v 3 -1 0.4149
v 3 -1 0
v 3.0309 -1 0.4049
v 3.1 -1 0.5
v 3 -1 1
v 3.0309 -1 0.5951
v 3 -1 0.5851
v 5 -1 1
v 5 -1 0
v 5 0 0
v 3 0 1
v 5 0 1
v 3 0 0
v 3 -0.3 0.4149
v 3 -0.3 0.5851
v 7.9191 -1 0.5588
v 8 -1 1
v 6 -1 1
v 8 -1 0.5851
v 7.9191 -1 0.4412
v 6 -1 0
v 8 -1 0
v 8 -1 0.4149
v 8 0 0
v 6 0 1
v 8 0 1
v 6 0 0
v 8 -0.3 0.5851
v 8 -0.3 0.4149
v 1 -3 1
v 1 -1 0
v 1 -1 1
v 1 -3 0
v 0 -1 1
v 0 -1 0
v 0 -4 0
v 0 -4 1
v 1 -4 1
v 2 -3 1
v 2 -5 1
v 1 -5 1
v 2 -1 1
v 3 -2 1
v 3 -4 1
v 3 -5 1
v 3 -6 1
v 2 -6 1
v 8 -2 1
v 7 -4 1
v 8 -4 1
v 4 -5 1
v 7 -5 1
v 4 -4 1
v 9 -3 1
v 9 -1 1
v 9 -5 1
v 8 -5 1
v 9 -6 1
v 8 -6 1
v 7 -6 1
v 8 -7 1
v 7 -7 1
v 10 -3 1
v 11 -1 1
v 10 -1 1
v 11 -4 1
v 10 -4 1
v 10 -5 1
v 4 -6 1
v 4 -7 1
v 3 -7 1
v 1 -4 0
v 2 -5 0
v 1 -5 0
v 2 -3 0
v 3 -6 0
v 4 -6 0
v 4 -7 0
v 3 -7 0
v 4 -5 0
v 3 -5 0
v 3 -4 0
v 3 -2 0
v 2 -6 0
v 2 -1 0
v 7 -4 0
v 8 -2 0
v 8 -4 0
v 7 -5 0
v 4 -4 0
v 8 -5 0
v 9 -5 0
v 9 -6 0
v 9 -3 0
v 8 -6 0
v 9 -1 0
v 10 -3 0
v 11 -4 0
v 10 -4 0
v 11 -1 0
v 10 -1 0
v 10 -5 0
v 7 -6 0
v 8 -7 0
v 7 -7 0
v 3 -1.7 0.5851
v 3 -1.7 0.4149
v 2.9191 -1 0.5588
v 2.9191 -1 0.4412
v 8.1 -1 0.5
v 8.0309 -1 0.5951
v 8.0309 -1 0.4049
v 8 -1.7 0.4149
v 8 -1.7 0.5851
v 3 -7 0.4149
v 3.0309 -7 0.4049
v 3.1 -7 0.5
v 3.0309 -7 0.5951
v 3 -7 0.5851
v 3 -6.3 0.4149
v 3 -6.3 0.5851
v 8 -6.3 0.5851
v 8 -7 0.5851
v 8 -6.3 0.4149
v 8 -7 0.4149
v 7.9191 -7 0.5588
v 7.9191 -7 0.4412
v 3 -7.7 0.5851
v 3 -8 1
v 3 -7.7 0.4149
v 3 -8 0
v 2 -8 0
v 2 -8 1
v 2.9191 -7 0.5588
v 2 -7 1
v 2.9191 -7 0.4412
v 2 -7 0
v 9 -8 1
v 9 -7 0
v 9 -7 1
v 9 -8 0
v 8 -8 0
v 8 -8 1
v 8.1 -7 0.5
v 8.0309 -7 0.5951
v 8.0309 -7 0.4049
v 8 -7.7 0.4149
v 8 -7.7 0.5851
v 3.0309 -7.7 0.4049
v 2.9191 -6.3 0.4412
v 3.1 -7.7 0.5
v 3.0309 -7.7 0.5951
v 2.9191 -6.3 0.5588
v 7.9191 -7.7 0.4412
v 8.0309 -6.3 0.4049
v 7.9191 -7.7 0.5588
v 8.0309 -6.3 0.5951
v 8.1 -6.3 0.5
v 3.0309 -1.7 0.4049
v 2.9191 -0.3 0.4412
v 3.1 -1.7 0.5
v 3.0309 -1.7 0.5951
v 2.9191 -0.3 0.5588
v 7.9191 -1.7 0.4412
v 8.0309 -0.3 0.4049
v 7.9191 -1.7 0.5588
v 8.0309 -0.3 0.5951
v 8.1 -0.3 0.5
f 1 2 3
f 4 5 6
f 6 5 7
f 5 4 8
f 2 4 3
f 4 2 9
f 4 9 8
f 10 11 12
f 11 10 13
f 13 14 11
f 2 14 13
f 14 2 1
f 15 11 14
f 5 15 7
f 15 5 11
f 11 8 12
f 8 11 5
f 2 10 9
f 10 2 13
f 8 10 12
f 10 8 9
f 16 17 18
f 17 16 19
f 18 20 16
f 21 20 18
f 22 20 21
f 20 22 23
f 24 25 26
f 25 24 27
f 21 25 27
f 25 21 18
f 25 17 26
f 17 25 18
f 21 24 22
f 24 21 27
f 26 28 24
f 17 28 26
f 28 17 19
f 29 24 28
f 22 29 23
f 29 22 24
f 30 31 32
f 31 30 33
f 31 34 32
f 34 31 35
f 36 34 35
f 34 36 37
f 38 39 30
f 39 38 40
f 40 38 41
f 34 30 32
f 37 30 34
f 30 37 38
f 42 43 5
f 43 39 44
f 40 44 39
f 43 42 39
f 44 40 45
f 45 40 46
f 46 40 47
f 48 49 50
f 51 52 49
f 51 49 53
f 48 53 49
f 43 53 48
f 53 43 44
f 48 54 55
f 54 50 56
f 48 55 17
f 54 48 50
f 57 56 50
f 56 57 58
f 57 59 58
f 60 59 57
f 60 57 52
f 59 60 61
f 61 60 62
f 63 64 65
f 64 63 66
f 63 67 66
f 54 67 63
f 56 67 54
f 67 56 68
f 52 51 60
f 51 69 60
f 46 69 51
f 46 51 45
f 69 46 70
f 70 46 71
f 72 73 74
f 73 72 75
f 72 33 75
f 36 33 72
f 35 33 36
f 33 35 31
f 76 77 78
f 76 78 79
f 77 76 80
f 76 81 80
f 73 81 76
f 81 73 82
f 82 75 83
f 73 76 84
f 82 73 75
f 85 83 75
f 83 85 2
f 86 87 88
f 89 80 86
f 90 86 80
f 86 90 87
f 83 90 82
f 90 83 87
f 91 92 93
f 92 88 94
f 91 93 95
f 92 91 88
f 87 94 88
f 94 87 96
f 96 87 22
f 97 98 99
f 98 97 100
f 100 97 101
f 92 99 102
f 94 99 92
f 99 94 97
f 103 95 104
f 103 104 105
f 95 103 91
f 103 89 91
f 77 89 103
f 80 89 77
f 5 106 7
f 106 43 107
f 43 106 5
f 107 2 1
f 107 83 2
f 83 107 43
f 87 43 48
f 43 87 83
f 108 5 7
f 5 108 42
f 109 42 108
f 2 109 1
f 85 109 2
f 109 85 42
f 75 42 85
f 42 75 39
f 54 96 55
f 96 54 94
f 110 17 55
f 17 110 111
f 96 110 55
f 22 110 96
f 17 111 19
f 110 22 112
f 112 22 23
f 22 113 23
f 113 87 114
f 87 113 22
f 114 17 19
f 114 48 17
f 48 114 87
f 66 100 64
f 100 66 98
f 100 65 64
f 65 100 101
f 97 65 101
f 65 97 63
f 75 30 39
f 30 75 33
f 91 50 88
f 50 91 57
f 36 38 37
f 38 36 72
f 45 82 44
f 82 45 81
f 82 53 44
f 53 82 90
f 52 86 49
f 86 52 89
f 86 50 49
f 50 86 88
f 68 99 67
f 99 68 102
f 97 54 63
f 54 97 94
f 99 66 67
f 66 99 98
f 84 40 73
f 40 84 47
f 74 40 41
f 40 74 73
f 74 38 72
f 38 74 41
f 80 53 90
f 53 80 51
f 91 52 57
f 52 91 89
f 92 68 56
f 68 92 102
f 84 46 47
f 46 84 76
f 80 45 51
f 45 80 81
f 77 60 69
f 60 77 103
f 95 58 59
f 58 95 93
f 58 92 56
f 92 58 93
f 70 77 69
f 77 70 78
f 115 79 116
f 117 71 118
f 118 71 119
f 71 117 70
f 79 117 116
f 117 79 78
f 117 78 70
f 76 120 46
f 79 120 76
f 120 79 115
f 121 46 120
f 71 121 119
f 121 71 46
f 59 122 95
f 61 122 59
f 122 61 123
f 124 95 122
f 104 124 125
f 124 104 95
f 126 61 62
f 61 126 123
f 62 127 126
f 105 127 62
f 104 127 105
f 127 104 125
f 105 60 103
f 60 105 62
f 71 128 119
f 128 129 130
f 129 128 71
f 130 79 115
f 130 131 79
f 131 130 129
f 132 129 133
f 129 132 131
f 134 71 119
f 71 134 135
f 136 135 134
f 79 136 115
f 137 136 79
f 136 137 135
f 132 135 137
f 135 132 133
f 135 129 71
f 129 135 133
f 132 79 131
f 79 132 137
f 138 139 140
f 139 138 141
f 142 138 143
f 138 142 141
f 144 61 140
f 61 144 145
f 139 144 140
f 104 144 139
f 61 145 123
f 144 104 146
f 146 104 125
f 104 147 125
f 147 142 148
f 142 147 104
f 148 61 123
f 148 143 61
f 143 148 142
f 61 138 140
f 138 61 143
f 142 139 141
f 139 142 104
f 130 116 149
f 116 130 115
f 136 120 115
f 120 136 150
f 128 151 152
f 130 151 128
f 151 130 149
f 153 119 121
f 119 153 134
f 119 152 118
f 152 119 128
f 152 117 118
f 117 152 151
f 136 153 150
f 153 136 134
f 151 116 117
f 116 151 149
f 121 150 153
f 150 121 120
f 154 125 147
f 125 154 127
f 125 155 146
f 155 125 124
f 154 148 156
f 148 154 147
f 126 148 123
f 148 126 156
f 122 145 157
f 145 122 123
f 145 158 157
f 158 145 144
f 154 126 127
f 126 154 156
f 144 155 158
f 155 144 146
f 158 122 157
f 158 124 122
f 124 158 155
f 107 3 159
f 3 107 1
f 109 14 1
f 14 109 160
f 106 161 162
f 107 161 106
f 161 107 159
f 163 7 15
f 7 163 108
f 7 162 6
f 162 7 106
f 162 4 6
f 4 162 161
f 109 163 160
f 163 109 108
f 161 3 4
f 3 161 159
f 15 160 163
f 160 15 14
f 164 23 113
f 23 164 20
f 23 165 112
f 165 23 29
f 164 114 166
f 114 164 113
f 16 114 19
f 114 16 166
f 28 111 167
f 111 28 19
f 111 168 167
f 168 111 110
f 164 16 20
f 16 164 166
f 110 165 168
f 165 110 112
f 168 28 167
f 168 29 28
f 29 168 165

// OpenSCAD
rotate([90,0,0]) {
	union(){	
		translate([3,0,0]) cube(1);
		translate([4,0,0]) cube(1);
		translate([6,0,0]) cube(1);
		translate([7,0,0]) cube(1);

		translate([0,0,1]) cube(1);
		translate([2,0,1]) cube(1);
		translate([8,0,1]) cube(1);
		translate([10,0,1]) cube(1);

		translate([0,0,2]) cube(1);
		translate([2,0,2]) cube(1);
		translate([3,0,2]) cube(1);
		translate([4,0,2]) cube(1);
		translate([5,0,2]) cube(1);
		translate([6,0,2]) cube(1);
		translate([7,0,2]) cube(1);
		translate([8,0,2]) cube(1);
		translate([10,0,2]) cube(1);

		translate([0,0,3]) cube(1);
		translate([1,0,3]) cube(1);
		translate([2,0,3]) cube(1);
		translate([3,0,3]) cube(1);
		translate([4,0,3]) cube(1);
		translate([5,0,3]) cube(1);
		translate([6,0,3]) cube(1);
		translate([7,0,3]) cube(1);
		translate([8,0,3]) cube(1);
		translate([9,0,3]) cube(1);
		translate([10,0,3]) cube(1);

		translate([1,0,4]) cube(1);
		translate([2,0,4]) cube(1);
		translate([4,0,4]) cube(1);
		translate([5,0,4]) cube(1);
		translate([6,0,4]) cube(1);
		translate([8,0,4]) cube(1);
		translate([9,0,4]) cube(1);

		translate([2,0,5]) cube(1);
		translate([3,0,5]) cube(1);
		translate([4,0,5]) cube(1);
		translate([5,0,5]) cube(1);
		translate([6,0,5]) cube(1);
		translate([7,0,5]) cube(1);
		translate([8,0,5]) cube(1);
	
		translate([3,0,6]) cube(1);
		translate([7,0,6]) cube(1);
	
		translate([2,0,7]) cube(1);
		translate([8,0,7]) cube(1);
	
		translate([3,0.5,7]) 
		cylinder(h = 1.4, r = 0.1, center=true);

		translate([8,0.5,7]) 
		cylinder(h = 1.4, r = 0.1, center=true);
	
		translate([3,0.5,1]) 
		cylinder(h = 1.4, r = 0.1, center=true);

	
		translate([8,0.5,1]) 
		cylinder(h = 1.4, r = 0.1, center=true);
	}
}
